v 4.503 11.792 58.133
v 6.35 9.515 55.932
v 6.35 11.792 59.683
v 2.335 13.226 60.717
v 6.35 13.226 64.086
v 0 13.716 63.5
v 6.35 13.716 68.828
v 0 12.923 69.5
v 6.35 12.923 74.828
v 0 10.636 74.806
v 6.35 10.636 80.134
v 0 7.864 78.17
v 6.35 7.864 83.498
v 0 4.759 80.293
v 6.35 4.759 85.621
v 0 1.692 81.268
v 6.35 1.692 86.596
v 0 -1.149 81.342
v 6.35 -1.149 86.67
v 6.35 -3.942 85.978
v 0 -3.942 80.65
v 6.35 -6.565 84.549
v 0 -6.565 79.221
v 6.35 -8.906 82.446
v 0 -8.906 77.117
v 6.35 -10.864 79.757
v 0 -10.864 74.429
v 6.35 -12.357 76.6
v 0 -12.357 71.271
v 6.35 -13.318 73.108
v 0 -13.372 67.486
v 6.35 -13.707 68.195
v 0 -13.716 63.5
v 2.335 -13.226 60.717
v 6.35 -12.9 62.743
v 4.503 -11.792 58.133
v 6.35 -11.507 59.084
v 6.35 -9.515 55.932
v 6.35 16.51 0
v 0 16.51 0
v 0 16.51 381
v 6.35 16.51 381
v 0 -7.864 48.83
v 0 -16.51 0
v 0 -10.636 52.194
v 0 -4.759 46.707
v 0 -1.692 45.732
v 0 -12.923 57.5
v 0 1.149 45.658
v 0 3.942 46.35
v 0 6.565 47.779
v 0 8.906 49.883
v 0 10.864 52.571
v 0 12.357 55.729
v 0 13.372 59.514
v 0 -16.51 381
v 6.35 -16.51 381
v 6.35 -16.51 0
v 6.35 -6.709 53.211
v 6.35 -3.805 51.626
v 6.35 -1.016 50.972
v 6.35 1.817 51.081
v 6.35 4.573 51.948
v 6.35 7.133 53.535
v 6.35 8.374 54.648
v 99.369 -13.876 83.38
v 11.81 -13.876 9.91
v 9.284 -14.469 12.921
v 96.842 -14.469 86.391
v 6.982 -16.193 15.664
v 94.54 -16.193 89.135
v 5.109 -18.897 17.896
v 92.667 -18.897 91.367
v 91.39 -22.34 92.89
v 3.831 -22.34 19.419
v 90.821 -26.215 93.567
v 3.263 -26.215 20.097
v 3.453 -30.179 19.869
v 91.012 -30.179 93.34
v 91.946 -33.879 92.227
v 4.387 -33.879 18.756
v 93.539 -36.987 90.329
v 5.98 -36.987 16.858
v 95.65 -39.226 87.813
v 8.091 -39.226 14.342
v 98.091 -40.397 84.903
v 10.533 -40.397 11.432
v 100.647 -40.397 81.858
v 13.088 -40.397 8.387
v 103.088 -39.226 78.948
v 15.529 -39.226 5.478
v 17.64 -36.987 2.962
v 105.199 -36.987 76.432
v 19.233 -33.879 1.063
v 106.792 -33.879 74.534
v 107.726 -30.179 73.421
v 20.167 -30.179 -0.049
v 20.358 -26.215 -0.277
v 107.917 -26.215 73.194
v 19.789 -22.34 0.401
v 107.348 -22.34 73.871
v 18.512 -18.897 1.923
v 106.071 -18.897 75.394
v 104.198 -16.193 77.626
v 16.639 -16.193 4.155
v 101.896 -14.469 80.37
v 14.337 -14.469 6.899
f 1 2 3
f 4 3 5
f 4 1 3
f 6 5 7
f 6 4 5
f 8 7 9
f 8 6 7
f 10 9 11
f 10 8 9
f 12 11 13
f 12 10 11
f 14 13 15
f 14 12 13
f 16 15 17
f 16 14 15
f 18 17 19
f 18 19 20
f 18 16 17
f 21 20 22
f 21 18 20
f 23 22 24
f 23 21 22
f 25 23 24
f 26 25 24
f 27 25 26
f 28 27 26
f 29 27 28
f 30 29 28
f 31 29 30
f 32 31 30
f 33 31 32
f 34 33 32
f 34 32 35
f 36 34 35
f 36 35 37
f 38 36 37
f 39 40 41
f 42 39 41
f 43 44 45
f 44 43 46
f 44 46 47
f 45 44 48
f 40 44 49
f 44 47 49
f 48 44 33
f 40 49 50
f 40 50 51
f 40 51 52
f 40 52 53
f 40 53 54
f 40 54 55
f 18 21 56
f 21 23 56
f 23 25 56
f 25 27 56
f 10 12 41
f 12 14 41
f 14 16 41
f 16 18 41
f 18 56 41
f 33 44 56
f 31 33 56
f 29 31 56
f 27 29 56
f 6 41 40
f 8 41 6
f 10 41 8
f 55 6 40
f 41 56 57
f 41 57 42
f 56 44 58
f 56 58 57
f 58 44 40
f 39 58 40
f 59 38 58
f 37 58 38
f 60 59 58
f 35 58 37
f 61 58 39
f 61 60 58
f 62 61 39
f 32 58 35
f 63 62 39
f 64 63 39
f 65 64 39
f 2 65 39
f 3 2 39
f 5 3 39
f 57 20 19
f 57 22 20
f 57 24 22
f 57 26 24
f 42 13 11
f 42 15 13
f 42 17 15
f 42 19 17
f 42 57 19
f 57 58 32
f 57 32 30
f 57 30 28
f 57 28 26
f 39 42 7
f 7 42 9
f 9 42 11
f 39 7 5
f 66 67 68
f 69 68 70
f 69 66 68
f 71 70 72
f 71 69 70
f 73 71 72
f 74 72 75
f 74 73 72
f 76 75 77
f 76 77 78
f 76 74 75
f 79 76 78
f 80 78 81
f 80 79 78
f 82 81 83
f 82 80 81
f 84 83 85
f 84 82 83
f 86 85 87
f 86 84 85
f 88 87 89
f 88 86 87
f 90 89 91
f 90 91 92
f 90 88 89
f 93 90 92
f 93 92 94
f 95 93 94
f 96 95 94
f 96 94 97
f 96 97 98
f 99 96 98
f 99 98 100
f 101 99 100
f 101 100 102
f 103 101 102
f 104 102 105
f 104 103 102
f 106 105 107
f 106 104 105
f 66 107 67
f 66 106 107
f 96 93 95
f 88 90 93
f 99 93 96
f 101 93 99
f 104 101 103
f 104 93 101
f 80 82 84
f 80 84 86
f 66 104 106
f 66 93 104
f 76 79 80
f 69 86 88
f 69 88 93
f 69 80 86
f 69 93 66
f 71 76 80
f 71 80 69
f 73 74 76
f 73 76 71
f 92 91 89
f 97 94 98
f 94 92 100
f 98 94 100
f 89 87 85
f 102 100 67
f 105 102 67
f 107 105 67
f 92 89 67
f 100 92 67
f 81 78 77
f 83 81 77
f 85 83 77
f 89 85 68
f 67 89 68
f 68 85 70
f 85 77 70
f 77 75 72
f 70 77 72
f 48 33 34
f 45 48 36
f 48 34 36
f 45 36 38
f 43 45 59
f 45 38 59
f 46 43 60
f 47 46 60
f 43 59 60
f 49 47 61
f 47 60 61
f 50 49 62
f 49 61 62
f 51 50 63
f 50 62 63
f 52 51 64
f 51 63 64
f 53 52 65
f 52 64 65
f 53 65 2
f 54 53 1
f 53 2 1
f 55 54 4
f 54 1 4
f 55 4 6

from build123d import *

# Parameters (mm, degrees)
F0_W          = 33.02
F0_H          = 381
F1_DEPTH      = 6.35
F3_R          = 13.716
F4_DEPTH      = 208.9504482893
F4_DEPTH_BACK = 40.8180132151
F5_R          = 13.335
F6_DEPTH      = 88.9
F6_DEPTH_BACK = 25.4


with BuildPart() as f1:
    # F0 (on Right) → F1 (new body)
    with BuildSketch(Plane.YZ):
        with Locations((0, 190.5)):
            Rectangle(F0_W, F0_H)
    extrude(amount=F1_DEPTH)

    # F3 (on line) → F4 (cut, two sides)
    with BuildSketch(Plane(origin=(31.2676461581, 0, 26.2366703591), x_dir=(0, 1, 0), z_dir=(0.7660444431, 0, 0.6427876097))) as f4_sk:
        with Locations((0, 48.6438221381)):
            Circle(F3_R)
    extrude(amount=F4_DEPTH, mode=Mode.SUBTRACT)
    extrude(f4_sk.sketch, amount=-F4_DEPTH_BACK, mode=Mode.SUBTRACT)


with BuildPart() as f6:
    # F5 (on line) → F6 (new body, two sides)
    with BuildSketch(Plane(origin=(31.2676461581, 0, 26.2366703591), x_dir=(0, 1, 0), z_dir=(0.7660444431, 0, 0.6427876097))) as f6_sk:
        with Locations((-27.2113421434, 0)):
            Circle(F5_R)
    extrude(amount=F6_DEPTH)
    extrude(f6_sk.sketch, amount=-F6_DEPTH_BACK)


solid = Compound([f1.part, f6.part])
